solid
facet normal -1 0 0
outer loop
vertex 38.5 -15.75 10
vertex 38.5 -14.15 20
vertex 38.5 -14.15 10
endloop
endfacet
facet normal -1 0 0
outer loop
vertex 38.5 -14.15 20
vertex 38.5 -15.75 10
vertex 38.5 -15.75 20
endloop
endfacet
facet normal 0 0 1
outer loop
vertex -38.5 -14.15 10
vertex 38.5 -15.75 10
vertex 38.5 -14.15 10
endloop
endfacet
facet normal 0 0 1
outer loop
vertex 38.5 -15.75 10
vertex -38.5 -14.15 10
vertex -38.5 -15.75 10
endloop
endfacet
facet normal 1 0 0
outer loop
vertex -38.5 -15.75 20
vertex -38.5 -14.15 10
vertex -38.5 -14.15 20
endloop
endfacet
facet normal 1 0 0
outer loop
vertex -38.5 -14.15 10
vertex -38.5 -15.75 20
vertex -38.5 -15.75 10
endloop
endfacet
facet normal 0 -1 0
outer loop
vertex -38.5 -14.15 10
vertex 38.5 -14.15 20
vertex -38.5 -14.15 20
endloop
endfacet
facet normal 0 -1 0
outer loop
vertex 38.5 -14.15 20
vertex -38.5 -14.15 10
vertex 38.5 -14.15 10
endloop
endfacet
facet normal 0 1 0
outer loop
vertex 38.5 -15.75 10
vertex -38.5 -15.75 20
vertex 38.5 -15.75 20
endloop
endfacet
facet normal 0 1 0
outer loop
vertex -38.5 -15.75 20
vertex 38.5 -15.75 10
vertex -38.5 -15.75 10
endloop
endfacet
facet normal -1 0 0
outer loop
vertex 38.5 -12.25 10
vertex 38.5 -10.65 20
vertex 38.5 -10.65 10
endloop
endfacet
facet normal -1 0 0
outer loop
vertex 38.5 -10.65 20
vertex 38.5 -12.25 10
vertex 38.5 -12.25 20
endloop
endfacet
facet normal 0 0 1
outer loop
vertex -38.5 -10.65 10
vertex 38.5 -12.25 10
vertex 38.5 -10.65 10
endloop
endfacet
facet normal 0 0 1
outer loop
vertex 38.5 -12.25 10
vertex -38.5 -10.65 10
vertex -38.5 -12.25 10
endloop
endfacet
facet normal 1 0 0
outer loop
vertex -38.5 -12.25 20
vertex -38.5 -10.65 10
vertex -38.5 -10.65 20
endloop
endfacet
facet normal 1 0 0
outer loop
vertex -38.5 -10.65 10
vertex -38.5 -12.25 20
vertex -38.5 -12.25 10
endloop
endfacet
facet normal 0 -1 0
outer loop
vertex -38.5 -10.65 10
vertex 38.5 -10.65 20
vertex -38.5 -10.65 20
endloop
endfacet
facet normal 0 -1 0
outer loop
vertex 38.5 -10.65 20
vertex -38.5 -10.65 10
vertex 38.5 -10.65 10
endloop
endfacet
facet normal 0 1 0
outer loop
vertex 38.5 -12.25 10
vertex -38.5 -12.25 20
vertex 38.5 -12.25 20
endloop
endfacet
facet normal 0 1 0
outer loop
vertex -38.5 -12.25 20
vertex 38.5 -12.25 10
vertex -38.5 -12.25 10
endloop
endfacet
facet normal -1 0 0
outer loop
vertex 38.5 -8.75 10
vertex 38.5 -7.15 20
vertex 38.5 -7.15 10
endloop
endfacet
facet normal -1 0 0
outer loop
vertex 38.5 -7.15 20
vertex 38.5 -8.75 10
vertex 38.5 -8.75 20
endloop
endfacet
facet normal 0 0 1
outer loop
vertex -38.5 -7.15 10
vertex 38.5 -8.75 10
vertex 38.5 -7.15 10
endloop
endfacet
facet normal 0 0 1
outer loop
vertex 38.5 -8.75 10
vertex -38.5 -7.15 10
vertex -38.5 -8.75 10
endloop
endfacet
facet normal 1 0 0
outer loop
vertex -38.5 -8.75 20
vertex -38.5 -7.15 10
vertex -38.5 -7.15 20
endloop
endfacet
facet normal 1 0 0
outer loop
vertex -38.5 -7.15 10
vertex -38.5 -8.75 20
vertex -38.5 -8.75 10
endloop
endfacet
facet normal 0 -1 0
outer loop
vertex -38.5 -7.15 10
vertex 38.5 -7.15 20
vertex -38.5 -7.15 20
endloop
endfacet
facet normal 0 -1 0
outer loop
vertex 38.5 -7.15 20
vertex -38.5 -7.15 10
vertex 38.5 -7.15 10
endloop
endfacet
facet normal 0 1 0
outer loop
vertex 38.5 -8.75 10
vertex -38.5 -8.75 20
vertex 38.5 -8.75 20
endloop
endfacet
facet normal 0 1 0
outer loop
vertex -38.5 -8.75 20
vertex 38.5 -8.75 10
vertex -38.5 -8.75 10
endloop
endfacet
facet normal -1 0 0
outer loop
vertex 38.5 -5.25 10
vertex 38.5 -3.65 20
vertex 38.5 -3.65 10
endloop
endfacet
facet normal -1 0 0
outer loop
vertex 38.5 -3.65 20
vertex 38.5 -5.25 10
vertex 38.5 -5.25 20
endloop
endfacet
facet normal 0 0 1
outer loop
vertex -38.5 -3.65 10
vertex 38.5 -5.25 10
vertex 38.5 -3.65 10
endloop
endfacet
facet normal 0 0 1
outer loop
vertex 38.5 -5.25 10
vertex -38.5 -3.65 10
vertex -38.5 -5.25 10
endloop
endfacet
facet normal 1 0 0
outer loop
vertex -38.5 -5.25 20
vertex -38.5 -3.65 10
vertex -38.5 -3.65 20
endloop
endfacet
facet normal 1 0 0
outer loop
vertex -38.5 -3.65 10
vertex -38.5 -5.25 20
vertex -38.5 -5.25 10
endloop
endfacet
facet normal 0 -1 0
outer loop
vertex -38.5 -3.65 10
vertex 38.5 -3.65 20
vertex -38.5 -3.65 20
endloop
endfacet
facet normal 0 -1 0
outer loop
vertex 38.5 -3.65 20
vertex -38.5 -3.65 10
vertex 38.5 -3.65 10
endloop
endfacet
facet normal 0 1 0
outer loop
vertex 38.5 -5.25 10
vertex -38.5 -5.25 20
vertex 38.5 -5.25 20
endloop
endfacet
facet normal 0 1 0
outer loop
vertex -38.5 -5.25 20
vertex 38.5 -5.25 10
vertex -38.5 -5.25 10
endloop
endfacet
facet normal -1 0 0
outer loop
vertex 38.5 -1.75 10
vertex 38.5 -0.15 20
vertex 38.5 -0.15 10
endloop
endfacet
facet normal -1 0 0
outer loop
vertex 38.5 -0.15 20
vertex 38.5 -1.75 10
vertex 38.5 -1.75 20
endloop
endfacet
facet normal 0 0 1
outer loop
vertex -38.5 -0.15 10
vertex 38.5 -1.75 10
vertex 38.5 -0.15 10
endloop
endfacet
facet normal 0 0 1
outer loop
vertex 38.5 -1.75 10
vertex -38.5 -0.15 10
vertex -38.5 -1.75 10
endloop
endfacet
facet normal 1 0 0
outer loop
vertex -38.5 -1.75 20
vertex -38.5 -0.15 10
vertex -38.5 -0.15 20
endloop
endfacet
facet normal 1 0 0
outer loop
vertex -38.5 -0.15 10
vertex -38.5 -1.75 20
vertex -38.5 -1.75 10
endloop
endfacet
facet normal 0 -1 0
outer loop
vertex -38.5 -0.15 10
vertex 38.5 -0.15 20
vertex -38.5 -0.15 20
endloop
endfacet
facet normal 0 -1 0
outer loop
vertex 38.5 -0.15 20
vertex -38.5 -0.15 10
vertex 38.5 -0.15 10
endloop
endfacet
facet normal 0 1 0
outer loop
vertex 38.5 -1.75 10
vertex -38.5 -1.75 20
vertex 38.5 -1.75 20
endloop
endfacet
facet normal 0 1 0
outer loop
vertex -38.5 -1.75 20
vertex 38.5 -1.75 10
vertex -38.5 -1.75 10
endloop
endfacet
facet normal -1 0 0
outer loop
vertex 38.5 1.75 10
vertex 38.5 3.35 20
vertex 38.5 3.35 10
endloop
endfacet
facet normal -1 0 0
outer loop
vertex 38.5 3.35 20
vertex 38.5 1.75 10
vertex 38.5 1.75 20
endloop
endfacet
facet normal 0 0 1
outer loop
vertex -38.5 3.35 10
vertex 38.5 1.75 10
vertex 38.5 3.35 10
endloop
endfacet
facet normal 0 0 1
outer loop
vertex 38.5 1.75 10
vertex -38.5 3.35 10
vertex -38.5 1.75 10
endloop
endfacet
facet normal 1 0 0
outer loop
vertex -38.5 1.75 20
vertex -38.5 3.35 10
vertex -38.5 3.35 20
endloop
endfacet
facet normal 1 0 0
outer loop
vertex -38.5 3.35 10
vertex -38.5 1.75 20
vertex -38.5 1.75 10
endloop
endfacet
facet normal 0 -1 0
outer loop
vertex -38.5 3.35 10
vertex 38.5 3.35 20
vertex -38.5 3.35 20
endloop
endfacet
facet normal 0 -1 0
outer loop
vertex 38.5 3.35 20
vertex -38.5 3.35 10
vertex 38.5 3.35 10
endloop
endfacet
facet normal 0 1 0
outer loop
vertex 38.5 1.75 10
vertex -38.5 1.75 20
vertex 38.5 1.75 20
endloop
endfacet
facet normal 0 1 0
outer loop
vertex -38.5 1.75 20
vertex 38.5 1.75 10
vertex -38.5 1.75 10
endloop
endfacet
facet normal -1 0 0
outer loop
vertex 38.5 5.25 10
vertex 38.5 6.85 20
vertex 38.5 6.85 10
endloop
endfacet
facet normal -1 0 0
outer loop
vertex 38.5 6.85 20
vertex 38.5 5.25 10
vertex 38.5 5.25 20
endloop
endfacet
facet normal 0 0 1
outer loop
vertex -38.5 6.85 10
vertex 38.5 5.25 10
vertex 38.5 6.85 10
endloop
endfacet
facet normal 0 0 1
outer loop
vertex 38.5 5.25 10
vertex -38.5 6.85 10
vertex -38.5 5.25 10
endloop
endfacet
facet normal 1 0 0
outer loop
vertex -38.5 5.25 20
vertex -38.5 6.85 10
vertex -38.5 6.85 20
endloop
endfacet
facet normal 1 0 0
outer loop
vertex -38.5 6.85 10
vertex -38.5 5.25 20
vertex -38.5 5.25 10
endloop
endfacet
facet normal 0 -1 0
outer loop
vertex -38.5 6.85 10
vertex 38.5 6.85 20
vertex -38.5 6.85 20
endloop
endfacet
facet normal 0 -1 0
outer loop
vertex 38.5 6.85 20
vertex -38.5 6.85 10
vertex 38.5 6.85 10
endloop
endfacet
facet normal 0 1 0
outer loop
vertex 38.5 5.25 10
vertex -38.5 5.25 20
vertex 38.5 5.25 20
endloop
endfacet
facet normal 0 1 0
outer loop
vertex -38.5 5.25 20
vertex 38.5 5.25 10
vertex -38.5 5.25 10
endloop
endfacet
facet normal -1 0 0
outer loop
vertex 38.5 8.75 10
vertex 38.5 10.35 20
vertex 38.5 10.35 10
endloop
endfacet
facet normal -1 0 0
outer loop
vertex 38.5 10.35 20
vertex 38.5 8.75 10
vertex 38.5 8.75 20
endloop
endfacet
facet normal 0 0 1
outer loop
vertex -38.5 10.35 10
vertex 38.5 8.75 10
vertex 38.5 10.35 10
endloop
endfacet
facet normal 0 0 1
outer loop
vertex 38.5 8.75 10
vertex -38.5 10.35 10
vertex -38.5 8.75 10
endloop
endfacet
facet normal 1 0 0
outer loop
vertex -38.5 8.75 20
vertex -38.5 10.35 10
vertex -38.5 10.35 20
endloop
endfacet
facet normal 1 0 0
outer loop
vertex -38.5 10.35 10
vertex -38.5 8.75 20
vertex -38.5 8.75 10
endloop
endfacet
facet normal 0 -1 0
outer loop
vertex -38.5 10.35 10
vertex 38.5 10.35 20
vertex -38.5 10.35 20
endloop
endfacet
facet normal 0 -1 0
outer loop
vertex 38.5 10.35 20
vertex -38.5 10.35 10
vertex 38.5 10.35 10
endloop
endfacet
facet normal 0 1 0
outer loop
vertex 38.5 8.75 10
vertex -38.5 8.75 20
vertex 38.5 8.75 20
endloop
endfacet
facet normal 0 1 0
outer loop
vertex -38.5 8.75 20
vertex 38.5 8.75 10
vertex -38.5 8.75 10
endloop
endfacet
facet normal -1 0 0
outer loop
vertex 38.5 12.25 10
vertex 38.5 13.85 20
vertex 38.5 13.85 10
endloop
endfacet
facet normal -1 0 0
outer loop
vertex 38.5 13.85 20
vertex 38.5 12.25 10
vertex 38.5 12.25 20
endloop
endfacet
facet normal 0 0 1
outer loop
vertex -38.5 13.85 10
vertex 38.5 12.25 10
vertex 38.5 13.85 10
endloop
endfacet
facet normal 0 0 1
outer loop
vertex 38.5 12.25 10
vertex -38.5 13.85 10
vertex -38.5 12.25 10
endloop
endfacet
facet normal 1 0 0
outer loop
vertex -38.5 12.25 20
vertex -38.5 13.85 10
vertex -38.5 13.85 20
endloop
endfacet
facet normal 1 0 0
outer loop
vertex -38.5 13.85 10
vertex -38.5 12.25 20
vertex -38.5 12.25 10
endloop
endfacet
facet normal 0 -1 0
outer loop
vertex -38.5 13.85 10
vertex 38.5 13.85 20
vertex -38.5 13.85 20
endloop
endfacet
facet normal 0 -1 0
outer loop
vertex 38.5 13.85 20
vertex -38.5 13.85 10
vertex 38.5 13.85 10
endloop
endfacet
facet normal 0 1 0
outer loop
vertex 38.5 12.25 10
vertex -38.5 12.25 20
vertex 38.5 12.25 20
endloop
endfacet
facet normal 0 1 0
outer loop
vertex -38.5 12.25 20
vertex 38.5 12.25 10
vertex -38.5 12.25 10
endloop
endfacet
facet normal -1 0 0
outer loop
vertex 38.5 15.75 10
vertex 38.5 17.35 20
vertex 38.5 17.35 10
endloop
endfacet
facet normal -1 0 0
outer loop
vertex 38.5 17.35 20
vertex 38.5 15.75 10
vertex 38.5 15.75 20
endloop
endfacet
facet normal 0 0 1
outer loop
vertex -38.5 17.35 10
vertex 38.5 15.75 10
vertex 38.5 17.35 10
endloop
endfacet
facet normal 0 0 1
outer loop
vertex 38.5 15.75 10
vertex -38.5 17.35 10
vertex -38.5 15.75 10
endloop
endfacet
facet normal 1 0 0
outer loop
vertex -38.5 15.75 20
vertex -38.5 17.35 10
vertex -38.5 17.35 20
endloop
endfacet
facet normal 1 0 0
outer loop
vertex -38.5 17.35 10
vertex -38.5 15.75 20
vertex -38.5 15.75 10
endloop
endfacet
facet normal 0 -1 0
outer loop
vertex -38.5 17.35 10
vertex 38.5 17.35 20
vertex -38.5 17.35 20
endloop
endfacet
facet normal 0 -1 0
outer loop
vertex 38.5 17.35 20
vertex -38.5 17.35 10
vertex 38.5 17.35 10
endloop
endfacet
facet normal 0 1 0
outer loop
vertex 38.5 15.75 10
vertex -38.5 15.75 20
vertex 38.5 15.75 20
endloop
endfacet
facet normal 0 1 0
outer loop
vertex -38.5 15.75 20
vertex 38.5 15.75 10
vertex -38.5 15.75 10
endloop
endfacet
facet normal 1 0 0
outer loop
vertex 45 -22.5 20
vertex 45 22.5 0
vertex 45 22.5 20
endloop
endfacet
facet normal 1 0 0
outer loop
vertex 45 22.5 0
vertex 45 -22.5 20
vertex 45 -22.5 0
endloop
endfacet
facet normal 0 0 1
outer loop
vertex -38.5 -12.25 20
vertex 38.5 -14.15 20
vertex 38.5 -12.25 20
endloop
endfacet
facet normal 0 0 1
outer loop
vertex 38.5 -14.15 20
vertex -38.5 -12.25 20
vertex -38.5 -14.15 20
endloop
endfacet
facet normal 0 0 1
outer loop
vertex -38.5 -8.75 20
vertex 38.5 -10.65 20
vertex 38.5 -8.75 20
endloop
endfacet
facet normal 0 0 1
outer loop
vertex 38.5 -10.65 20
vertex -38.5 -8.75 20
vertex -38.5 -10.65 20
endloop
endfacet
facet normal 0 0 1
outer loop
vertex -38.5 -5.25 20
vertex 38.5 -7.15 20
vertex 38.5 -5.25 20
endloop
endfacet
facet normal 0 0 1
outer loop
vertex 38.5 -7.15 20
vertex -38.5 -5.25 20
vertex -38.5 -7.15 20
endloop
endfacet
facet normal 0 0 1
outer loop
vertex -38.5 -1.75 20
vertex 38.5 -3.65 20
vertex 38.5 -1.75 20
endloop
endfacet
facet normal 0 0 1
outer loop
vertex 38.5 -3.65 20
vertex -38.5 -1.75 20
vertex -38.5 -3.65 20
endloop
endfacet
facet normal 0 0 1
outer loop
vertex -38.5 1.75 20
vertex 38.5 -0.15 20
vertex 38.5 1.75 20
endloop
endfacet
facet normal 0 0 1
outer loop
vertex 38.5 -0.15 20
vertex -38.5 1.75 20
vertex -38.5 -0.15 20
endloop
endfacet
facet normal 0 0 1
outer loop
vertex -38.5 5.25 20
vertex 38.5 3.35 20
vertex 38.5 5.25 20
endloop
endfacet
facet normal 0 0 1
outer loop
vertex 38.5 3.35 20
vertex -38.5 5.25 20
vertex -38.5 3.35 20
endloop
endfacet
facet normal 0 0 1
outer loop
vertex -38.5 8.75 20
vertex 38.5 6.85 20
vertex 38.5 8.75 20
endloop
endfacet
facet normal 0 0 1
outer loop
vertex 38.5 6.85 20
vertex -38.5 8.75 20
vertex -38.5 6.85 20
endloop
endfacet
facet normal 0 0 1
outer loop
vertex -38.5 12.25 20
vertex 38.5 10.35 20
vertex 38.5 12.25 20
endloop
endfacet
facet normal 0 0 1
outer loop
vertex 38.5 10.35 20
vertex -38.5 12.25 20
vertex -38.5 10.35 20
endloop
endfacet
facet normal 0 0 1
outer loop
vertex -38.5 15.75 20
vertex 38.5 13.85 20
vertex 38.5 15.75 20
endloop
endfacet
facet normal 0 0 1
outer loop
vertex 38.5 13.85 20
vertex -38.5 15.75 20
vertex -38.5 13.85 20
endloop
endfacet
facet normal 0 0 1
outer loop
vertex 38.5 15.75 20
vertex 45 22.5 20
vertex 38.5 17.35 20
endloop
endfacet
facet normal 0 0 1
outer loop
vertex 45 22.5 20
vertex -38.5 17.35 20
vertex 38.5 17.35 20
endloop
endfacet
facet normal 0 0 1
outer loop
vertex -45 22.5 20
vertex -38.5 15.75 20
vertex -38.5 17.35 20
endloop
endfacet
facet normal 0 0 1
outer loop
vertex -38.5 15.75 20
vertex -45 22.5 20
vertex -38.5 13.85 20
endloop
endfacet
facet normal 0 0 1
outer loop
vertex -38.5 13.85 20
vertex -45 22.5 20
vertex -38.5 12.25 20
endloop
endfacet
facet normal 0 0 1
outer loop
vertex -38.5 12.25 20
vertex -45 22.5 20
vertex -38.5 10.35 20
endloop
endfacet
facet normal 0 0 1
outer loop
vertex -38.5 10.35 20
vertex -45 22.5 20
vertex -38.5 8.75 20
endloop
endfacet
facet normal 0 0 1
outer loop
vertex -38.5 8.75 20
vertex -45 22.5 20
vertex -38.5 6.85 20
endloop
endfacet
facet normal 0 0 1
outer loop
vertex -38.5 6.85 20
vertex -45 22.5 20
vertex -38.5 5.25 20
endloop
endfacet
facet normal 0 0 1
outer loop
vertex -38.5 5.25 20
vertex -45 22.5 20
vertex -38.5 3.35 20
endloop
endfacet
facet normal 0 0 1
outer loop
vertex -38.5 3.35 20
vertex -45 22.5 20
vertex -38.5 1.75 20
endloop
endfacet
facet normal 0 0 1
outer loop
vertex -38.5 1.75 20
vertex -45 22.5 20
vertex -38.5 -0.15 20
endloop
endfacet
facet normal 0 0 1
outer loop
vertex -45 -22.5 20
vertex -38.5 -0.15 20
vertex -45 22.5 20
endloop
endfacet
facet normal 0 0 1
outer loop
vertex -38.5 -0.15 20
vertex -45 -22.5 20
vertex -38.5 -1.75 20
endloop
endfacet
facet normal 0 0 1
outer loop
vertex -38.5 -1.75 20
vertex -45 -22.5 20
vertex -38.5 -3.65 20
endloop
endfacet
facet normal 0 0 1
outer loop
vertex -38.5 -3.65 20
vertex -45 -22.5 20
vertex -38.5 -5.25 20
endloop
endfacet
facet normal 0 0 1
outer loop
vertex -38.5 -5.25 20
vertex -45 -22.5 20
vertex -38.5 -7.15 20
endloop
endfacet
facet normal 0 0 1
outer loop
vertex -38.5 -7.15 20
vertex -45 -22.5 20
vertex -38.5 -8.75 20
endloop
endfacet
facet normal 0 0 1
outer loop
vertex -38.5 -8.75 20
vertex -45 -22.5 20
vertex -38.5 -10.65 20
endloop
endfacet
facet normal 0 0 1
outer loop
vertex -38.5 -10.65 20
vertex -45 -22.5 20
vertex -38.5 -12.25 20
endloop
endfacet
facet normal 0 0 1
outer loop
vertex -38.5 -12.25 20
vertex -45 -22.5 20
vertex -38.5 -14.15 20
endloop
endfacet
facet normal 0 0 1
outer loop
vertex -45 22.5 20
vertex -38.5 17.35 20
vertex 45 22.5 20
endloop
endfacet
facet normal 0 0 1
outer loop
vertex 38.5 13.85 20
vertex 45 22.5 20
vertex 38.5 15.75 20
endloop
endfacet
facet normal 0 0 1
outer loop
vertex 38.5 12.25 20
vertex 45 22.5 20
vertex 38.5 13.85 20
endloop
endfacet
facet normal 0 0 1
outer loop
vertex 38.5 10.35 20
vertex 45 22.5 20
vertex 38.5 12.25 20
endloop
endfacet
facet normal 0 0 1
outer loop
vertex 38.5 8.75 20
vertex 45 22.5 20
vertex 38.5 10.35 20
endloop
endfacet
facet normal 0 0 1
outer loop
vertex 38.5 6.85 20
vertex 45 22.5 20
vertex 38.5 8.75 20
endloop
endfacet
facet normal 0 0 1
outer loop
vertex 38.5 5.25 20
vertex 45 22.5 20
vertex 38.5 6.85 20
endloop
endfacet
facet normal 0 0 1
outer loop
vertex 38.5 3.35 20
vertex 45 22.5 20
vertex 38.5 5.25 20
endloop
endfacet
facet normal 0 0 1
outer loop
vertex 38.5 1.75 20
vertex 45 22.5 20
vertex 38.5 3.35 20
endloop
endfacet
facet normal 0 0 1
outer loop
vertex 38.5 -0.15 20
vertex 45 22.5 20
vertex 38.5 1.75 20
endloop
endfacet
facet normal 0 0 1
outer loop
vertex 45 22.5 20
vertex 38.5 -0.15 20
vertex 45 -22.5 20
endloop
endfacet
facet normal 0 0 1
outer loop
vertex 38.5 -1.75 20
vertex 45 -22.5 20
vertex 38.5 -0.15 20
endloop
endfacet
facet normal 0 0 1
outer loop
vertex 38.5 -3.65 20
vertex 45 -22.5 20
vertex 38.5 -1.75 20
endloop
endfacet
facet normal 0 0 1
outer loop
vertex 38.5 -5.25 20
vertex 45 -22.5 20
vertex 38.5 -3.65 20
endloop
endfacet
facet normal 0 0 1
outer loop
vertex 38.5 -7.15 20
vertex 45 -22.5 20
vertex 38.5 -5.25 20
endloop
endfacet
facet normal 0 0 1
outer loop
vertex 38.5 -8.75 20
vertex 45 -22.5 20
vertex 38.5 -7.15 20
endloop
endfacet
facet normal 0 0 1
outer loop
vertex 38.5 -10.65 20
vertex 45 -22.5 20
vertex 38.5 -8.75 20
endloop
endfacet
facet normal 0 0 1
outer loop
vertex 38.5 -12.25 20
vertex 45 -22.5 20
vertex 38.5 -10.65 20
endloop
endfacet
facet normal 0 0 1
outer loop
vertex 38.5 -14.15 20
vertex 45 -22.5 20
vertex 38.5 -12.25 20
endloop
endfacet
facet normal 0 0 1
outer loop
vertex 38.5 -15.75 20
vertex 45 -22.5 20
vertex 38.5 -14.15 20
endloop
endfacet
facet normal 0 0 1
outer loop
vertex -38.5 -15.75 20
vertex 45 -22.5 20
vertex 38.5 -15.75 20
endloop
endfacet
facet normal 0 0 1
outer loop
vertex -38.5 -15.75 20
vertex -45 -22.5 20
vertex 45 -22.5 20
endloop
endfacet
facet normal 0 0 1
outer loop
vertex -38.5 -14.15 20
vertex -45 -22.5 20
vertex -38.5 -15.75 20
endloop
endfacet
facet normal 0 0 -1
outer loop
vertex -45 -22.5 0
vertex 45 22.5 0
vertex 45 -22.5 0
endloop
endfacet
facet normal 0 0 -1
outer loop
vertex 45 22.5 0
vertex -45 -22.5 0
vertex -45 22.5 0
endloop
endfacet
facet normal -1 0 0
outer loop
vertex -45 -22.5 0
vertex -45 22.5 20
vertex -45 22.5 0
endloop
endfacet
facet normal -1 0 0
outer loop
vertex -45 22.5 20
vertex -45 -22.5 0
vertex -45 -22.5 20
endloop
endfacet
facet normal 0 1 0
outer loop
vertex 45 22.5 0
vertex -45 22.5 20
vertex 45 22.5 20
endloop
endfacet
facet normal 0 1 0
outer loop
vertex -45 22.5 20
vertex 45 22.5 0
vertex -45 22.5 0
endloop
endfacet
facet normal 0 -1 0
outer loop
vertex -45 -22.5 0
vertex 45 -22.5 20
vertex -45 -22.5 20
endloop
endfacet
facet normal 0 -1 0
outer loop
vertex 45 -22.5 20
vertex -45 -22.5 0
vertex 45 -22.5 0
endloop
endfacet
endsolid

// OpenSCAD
// Microscope slide drying rack
// Print orientation: base block on XY plane, slots open upward (+Z)

// ---------------- Parameters ----------------
block_len    = 90;    // base block length along X (mm)
block_wid    = 45;    // base block width along Y (mm)
block_h      = 20;    // base block height along Z (mm)

slot_count   = 10;    // number of slide slots
slot_len     = 77;    // slot length along X (mm)
slot_w       = 1.6;   // slot width along Y (mm)
slot_depth   = 10;    // slot depth into block from top face (mm)
slot_pitch   = 3.5;   // centre-to-centre slot spacing along Y (mm)

eps          = 0.5;   // overshoot of cutters past the top face (mm)

$fn = 64;

// ---------------- Model ----------------
difference() {
    // Base block, centred in X and Y
    translate([-block_len/2, -block_wid/2, 0])
        cube([block_len, block_wid, block_h]);

    // Parallel slots running along X, centred in X and Y
    for (i = [0 : slot_count - 1]) {
        y = (i - (slot_count - 1)/2) * slot_pitch;
        translate([-slot_len/2, y, block_h - slot_depth])
            cube([slot_len, slot_w, slot_depth + eps]);
    }
}
